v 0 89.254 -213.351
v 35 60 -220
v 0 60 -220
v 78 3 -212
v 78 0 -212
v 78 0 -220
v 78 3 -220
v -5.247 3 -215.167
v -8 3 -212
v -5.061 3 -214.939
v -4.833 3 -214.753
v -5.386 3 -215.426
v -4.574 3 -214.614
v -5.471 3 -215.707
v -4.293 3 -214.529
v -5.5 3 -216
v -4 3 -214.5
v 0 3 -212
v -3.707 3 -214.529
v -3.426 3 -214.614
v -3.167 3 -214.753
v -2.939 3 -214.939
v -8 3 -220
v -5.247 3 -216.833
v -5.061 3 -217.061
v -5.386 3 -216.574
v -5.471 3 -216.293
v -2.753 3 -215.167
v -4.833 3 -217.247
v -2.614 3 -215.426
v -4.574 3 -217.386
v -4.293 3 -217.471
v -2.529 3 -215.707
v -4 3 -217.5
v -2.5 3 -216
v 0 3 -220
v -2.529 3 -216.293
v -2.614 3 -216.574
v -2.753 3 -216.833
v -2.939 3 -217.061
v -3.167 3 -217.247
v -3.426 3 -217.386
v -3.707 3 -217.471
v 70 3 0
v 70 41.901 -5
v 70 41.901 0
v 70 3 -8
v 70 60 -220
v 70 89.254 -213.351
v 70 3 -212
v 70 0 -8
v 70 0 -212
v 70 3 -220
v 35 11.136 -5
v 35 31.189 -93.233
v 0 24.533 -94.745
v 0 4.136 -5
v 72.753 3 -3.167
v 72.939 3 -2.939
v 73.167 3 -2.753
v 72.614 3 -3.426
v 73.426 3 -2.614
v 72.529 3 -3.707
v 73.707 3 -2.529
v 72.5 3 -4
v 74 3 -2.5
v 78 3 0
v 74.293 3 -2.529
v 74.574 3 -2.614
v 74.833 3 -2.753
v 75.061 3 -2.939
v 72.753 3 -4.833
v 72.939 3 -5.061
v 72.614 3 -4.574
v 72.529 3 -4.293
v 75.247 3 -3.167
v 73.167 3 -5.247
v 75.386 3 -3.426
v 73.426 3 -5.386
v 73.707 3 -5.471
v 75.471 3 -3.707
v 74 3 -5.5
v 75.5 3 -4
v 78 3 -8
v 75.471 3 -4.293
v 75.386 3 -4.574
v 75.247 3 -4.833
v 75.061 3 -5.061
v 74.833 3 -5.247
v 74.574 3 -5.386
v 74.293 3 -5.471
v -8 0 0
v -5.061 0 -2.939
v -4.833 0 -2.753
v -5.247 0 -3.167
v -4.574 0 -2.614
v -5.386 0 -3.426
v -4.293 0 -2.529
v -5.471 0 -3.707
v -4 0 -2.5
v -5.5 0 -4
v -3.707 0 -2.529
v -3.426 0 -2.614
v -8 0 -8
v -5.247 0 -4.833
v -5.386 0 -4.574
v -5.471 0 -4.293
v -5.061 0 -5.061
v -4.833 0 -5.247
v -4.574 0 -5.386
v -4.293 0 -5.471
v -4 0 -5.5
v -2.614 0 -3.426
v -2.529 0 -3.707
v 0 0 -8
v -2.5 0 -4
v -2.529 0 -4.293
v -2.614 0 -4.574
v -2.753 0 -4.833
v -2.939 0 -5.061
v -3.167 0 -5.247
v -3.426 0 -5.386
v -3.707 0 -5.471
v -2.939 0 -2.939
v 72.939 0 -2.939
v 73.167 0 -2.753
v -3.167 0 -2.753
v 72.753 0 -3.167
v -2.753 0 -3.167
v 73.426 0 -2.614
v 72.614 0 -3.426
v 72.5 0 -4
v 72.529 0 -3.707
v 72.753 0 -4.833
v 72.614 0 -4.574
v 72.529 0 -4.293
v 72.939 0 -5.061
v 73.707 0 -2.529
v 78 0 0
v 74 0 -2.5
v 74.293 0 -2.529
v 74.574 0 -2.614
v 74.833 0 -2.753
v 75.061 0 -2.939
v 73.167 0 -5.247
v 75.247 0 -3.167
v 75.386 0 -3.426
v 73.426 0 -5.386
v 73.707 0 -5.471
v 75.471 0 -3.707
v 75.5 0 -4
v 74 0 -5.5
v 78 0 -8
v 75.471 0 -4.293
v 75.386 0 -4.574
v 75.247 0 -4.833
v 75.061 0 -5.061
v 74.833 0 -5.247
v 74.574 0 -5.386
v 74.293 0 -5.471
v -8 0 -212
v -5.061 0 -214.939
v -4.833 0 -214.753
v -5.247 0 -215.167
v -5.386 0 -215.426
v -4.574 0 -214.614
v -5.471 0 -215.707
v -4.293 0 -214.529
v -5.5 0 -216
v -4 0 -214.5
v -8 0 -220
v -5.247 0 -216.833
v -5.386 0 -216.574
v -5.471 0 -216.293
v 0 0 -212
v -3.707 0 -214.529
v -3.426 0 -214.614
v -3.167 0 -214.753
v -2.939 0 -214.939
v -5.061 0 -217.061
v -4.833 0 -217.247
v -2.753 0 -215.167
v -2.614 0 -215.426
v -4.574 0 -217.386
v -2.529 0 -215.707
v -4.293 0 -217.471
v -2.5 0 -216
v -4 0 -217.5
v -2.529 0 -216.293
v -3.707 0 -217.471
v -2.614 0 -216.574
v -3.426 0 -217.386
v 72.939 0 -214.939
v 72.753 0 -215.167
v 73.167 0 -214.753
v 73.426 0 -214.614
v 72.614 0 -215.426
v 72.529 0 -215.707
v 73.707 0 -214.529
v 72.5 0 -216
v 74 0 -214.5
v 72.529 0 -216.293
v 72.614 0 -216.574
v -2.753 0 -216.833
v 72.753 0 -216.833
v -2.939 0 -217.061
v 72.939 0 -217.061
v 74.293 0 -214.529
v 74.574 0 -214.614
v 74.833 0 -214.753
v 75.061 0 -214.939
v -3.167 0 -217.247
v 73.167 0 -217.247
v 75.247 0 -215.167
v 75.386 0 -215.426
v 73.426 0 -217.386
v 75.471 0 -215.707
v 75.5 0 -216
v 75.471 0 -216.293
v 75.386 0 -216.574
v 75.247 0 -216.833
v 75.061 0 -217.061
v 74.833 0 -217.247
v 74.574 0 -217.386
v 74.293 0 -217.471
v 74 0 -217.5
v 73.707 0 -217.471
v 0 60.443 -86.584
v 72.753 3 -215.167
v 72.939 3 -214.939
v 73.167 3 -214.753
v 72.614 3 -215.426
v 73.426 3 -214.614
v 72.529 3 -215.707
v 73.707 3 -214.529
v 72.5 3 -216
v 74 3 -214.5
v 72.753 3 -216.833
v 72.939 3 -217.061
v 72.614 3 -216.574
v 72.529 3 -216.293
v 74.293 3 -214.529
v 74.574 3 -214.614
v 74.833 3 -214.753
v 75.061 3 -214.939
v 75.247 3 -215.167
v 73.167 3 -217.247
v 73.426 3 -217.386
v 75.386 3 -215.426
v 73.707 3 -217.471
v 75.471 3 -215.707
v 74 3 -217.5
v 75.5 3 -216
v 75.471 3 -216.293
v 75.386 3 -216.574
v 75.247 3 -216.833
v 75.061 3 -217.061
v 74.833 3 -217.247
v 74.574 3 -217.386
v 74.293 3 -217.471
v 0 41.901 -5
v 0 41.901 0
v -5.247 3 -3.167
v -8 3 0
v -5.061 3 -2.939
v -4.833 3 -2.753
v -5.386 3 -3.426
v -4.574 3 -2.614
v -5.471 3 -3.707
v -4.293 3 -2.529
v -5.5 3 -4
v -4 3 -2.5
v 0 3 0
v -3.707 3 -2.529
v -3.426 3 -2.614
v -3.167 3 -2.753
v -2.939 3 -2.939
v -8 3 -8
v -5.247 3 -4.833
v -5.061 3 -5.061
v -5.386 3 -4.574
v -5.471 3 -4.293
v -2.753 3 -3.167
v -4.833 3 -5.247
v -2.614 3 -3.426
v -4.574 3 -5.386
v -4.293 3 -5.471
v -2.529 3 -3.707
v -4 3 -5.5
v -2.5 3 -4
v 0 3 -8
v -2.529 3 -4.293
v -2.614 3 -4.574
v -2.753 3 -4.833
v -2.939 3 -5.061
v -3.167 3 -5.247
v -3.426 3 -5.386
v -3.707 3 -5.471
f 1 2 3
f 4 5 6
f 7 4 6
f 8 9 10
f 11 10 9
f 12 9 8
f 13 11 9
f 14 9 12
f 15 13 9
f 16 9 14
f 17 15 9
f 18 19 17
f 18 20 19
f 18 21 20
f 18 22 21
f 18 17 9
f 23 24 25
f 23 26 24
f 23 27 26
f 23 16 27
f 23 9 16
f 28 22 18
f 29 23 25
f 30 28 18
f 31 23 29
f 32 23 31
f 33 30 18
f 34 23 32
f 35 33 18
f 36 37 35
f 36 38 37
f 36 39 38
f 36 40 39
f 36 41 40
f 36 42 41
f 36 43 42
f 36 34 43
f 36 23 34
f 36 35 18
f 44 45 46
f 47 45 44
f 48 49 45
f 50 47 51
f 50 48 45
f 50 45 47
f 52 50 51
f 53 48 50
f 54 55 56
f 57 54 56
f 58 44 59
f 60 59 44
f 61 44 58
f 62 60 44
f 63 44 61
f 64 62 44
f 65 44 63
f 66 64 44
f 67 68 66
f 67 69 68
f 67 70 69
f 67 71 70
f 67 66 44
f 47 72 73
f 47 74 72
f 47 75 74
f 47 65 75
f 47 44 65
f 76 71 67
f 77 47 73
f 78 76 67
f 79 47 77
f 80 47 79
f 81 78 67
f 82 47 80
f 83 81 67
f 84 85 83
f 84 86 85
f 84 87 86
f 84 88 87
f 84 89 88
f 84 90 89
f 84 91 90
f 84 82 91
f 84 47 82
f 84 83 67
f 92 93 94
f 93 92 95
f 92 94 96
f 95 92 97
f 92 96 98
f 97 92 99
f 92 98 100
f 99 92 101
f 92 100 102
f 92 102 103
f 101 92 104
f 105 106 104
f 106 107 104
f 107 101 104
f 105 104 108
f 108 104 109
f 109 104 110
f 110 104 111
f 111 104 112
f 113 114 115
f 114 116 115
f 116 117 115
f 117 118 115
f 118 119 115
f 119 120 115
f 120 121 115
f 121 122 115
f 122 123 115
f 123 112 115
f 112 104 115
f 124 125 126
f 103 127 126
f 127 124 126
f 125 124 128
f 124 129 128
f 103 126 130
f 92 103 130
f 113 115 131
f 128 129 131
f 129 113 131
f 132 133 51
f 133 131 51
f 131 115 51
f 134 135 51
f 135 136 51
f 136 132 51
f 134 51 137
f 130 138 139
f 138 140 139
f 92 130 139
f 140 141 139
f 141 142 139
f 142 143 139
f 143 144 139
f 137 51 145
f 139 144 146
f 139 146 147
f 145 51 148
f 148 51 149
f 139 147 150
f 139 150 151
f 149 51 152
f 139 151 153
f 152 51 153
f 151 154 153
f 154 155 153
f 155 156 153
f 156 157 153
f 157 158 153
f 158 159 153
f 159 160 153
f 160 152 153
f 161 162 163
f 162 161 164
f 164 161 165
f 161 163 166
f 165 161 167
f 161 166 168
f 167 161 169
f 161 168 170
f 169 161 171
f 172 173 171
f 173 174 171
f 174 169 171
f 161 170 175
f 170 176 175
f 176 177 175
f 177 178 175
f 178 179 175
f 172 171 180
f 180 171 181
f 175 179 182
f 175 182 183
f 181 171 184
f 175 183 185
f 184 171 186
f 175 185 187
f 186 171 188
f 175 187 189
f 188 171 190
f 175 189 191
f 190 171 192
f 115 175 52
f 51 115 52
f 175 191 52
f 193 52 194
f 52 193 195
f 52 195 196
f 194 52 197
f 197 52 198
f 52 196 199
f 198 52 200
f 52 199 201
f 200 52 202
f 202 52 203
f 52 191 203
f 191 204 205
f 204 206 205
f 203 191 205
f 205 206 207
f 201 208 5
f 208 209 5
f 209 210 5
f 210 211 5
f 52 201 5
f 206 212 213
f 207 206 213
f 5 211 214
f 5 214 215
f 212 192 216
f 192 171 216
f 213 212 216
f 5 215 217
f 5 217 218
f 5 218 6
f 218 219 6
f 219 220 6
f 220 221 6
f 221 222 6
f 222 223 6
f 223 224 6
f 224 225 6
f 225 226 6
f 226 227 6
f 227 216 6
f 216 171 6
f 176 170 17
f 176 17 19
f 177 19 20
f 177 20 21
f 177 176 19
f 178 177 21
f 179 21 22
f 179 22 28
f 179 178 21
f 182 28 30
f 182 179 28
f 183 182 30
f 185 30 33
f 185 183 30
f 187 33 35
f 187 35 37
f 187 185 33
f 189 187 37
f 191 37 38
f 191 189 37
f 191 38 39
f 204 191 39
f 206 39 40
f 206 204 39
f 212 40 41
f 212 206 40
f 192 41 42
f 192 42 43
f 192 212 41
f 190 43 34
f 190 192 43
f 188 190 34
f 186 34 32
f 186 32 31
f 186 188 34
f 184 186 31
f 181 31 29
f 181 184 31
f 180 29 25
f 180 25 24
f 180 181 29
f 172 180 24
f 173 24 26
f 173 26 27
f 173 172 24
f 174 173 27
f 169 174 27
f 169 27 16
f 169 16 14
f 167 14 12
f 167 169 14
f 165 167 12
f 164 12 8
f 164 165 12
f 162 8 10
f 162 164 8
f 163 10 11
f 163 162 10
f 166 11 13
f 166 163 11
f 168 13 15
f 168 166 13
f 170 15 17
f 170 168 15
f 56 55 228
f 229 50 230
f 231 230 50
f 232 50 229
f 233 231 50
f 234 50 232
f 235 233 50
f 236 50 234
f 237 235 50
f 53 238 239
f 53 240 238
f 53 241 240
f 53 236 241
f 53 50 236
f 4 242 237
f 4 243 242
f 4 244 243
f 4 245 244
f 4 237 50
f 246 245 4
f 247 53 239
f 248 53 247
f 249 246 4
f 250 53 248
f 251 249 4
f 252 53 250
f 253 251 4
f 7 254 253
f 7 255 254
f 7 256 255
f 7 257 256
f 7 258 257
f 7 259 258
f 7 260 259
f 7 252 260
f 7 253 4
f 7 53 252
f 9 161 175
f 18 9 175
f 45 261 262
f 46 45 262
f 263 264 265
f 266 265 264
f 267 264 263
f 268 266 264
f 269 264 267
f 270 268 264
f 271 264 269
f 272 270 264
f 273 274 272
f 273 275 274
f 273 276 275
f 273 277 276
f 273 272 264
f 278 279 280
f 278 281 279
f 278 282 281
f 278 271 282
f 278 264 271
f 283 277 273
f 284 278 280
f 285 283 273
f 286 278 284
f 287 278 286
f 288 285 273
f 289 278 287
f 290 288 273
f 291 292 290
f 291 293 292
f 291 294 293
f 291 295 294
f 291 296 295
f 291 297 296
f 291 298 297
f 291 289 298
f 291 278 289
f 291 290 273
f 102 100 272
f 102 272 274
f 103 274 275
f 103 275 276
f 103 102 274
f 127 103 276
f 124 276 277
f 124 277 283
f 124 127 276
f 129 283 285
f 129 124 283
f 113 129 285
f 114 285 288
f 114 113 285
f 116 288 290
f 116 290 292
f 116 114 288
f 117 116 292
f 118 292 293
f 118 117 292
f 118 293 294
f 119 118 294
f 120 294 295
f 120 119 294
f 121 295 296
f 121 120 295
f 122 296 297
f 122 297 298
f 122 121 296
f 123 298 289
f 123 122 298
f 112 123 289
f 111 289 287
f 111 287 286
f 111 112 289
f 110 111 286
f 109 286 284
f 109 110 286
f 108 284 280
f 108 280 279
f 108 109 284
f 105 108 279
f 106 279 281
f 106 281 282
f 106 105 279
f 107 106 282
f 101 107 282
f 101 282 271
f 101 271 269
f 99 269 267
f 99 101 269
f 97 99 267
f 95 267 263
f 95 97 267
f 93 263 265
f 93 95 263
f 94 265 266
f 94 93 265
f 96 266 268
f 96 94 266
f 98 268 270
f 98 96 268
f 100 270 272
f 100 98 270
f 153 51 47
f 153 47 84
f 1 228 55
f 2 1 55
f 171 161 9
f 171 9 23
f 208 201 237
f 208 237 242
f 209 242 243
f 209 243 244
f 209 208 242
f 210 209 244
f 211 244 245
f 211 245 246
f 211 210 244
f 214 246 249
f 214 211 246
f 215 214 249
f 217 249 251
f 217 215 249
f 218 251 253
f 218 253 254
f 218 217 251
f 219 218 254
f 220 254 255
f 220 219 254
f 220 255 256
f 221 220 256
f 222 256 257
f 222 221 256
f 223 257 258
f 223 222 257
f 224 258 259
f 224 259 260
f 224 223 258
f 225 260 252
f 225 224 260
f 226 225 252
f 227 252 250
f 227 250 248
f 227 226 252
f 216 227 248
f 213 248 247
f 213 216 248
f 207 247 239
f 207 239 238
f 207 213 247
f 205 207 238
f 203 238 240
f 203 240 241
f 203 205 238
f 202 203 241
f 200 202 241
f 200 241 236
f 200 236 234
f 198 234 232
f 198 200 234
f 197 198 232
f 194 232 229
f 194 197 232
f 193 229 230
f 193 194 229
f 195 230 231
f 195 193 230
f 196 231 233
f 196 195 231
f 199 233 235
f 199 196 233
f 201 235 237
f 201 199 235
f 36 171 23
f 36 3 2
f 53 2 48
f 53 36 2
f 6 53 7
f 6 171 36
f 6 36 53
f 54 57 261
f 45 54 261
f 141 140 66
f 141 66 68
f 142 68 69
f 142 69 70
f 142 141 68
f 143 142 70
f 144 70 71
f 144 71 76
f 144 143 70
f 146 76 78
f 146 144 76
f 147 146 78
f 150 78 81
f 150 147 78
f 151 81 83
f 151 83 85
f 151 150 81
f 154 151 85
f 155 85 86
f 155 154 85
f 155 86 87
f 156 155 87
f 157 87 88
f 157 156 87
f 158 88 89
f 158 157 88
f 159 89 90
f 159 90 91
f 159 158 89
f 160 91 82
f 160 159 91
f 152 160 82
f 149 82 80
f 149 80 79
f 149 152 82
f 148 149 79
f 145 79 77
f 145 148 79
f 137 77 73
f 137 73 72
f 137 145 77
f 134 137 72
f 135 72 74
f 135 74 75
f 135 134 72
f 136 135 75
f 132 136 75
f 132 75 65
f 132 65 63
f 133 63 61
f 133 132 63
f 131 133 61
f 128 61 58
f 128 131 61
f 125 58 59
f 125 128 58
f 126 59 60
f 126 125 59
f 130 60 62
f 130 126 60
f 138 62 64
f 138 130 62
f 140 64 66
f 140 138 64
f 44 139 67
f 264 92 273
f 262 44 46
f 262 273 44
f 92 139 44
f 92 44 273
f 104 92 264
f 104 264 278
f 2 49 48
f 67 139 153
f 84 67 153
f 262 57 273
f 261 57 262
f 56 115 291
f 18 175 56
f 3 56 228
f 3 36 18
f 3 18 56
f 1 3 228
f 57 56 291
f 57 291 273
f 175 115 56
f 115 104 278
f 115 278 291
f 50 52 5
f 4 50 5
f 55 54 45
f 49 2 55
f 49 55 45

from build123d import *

# Parameters (mm, degrees)
SKETCH3_W           = 220
SKETCH3_H           = 10
BOSS_EXTRUDE2_DEPTH = 70
BOSS_EXTRUDE3_DEPTH = 130
BOSS_EXTRUDE4_DEPTH = 225
CUT_EXTRUDE1_START  = -227.161631
CUT_EXTRUDE1_DEPTH  = 97.161631
BOSS_EXTRUDE5_REACH = 249.52
SKETCH9_W           = 5
SKETCH9_H           = 41.901402289
SKETCH10_W          = 13.70856438
SKETCH10_H          = 41.94949396
CUT_EXTRUDE2_DEPTH  = 248.520249593
SKETCH11_W          = 8
SKETCH11_H          = 8
SKETCH11_R          = 1.5
BOSS_EXTRUDE6_DEPTH = 3


with BuildPart() as part:
    # Sketch3 → Boss-Extrude2 (new body)
    with BuildSketch(Plane(origin=(0, 0, 0), x_dir=(0, 0, -1), z_dir=(1, 0, 0))):
        Polygon((220, 10), (220, 60), (0, 10), align=None)
        with Locations((110, 5)):
            Rectangle(SKETCH3_W, SKETCH3_H)
    extrude(amount=BOSS_EXTRUDE2_DEPTH)

    # Sketch4 → Boss-Extrude3 (add)
    with BuildSketch(Plane(origin=(0, 50.491159136, -222.161100196), x_dir=(-1, 0, 0), z_dir=(0, 0.22162110358896814, -0.9751328557914598))):
        Polygon((-70, 39.751328558), (-70, 9.751328558), (-35, 9.751328558), align=None)
        Polygon((0, 39.751328558), (-35, 9.751328558), (0, 9.751328558), align=None)
    extrude(amount=-BOSS_EXTRUDE3_DEPTH)

    # Sketch4<3> → Boss-Extrude4 (add)
    with BuildSketch(Plane(origin=(0, 50.491159136, -222.161100196), x_dir=(-1, 0, 0), z_dir=(0, 0.22162110358896814, -0.9751328557914598))):
        Polygon((-70, 39.751328558), (-70, 9.751328558), (-35, 9.751328558), align=None)
    extrude(amount=-BOSS_EXTRUDE4_DEPTH)

    # Sketch8 → Cut-Extrude1 (cut)
    with BuildSketch(Plane(origin=(0, 50.491159136, -222.161100196), x_dir=(-1, 0, 0), z_dir=(0, 0.22162110358896814, -0.9751328557914598)).offset(CUT_EXTRUDE1_START)):
        Polygon((-35, 9.751328558), (0, 2.925398567), (0, 9.751328558), align=None)
    extrude(amount=CUT_EXTRUDE1_DEPTH, mode=Mode.SUBTRACT)

    # Boss-Extrude5: up to this face of the body (flat: up to its plane)
    boss_extrude5_end = Plane(part.part.faces().sort_by_distance((70, 34.124937216, -122.542284952))[0])
    # Sketch9 → Boss-Extrude5 (add, up to the picked face)
    with BuildSketch(Plane.ZY, mode=Mode.PRIVATE) as boss_extrude5_sk1:
        with Locations((-2.5, 20.950701145)):
            Rectangle(SKETCH9_W, SKETCH9_H)
    boss_extrude5_tool1 = split(extrude(boss_extrude5_sk1.sketch, amount=-BOSS_EXTRUDE5_REACH, mode=Mode.PRIVATE), bisect_by=boss_extrude5_end, keep=Keep.BOTH, mode=Mode.PRIVATE)
    add(boss_extrude5_tool1.solids().sort_by(Axis((0, 20.950701, -2.5), (1, 0, 0)))[0])

    # Sketch10 → Cut-Extrude2 (cut, through all)
    with BuildSketch(Plane.ZY):
        with Locations((6.85428219, 20.97474698)):
            Rectangle(SKETCH10_W, SKETCH10_H)
    extrude(amount=-CUT_EXTRUDE2_DEPTH, mode=Mode.SUBTRACT)

    # Sketch11 → Boss-Extrude6 (add)
    # profile 1 of 4: a face of its own
    with BuildSketch(Plane(origin=(0, 0, 0), x_dir=(1, 0, 0), z_dir=(0, 1, 0))):
        with Locations((-4, 216)):
            Rectangle(SKETCH11_W, SKETCH11_H)
        with Locations(Location((-4, 216, 0), (0, 0, 270))):
            Circle(SKETCH11_R, mode=Mode.SUBTRACT)
    # profile 2 of 4: a face of its own
    with BuildSketch(Plane(origin=(0, 0, 0), x_dir=(1, 0, 0), z_dir=(0, 1, 0))):
        with Locations((74, 216)):
            Rectangle(SKETCH11_W, SKETCH11_H)
        with Locations(Location((74, 216, 0), (0, 0, 270))):
            Circle(SKETCH11_R, mode=Mode.SUBTRACT)
    # profile 3 of 4: a face of its own
    with BuildSketch(Plane(origin=(0, 0, 0), x_dir=(1, 0, 0), z_dir=(0, 1, 0))):
        with Locations((-4, 4)):
            Rectangle(SKETCH11_W, SKETCH11_H)
        with Locations(Location((-4, 4, 0), (0, 0, 270))):
            Circle(SKETCH11_R, mode=Mode.SUBTRACT)
    # profile 4 of 4: a face of its own
    with BuildSketch(Plane(origin=(0, 0, 0), x_dir=(1, 0, 0), z_dir=(0, 1, 0))):
        with Locations((74, 4)):
            Rectangle(SKETCH11_W, SKETCH11_H)
        with Locations(Location((74, 4, 0), (0, 0, 270))):
            Circle(SKETCH11_R, mode=Mode.SUBTRACT)
    extrude(amount=BOSS_EXTRUDE6_DEPTH)


solid = part.part
